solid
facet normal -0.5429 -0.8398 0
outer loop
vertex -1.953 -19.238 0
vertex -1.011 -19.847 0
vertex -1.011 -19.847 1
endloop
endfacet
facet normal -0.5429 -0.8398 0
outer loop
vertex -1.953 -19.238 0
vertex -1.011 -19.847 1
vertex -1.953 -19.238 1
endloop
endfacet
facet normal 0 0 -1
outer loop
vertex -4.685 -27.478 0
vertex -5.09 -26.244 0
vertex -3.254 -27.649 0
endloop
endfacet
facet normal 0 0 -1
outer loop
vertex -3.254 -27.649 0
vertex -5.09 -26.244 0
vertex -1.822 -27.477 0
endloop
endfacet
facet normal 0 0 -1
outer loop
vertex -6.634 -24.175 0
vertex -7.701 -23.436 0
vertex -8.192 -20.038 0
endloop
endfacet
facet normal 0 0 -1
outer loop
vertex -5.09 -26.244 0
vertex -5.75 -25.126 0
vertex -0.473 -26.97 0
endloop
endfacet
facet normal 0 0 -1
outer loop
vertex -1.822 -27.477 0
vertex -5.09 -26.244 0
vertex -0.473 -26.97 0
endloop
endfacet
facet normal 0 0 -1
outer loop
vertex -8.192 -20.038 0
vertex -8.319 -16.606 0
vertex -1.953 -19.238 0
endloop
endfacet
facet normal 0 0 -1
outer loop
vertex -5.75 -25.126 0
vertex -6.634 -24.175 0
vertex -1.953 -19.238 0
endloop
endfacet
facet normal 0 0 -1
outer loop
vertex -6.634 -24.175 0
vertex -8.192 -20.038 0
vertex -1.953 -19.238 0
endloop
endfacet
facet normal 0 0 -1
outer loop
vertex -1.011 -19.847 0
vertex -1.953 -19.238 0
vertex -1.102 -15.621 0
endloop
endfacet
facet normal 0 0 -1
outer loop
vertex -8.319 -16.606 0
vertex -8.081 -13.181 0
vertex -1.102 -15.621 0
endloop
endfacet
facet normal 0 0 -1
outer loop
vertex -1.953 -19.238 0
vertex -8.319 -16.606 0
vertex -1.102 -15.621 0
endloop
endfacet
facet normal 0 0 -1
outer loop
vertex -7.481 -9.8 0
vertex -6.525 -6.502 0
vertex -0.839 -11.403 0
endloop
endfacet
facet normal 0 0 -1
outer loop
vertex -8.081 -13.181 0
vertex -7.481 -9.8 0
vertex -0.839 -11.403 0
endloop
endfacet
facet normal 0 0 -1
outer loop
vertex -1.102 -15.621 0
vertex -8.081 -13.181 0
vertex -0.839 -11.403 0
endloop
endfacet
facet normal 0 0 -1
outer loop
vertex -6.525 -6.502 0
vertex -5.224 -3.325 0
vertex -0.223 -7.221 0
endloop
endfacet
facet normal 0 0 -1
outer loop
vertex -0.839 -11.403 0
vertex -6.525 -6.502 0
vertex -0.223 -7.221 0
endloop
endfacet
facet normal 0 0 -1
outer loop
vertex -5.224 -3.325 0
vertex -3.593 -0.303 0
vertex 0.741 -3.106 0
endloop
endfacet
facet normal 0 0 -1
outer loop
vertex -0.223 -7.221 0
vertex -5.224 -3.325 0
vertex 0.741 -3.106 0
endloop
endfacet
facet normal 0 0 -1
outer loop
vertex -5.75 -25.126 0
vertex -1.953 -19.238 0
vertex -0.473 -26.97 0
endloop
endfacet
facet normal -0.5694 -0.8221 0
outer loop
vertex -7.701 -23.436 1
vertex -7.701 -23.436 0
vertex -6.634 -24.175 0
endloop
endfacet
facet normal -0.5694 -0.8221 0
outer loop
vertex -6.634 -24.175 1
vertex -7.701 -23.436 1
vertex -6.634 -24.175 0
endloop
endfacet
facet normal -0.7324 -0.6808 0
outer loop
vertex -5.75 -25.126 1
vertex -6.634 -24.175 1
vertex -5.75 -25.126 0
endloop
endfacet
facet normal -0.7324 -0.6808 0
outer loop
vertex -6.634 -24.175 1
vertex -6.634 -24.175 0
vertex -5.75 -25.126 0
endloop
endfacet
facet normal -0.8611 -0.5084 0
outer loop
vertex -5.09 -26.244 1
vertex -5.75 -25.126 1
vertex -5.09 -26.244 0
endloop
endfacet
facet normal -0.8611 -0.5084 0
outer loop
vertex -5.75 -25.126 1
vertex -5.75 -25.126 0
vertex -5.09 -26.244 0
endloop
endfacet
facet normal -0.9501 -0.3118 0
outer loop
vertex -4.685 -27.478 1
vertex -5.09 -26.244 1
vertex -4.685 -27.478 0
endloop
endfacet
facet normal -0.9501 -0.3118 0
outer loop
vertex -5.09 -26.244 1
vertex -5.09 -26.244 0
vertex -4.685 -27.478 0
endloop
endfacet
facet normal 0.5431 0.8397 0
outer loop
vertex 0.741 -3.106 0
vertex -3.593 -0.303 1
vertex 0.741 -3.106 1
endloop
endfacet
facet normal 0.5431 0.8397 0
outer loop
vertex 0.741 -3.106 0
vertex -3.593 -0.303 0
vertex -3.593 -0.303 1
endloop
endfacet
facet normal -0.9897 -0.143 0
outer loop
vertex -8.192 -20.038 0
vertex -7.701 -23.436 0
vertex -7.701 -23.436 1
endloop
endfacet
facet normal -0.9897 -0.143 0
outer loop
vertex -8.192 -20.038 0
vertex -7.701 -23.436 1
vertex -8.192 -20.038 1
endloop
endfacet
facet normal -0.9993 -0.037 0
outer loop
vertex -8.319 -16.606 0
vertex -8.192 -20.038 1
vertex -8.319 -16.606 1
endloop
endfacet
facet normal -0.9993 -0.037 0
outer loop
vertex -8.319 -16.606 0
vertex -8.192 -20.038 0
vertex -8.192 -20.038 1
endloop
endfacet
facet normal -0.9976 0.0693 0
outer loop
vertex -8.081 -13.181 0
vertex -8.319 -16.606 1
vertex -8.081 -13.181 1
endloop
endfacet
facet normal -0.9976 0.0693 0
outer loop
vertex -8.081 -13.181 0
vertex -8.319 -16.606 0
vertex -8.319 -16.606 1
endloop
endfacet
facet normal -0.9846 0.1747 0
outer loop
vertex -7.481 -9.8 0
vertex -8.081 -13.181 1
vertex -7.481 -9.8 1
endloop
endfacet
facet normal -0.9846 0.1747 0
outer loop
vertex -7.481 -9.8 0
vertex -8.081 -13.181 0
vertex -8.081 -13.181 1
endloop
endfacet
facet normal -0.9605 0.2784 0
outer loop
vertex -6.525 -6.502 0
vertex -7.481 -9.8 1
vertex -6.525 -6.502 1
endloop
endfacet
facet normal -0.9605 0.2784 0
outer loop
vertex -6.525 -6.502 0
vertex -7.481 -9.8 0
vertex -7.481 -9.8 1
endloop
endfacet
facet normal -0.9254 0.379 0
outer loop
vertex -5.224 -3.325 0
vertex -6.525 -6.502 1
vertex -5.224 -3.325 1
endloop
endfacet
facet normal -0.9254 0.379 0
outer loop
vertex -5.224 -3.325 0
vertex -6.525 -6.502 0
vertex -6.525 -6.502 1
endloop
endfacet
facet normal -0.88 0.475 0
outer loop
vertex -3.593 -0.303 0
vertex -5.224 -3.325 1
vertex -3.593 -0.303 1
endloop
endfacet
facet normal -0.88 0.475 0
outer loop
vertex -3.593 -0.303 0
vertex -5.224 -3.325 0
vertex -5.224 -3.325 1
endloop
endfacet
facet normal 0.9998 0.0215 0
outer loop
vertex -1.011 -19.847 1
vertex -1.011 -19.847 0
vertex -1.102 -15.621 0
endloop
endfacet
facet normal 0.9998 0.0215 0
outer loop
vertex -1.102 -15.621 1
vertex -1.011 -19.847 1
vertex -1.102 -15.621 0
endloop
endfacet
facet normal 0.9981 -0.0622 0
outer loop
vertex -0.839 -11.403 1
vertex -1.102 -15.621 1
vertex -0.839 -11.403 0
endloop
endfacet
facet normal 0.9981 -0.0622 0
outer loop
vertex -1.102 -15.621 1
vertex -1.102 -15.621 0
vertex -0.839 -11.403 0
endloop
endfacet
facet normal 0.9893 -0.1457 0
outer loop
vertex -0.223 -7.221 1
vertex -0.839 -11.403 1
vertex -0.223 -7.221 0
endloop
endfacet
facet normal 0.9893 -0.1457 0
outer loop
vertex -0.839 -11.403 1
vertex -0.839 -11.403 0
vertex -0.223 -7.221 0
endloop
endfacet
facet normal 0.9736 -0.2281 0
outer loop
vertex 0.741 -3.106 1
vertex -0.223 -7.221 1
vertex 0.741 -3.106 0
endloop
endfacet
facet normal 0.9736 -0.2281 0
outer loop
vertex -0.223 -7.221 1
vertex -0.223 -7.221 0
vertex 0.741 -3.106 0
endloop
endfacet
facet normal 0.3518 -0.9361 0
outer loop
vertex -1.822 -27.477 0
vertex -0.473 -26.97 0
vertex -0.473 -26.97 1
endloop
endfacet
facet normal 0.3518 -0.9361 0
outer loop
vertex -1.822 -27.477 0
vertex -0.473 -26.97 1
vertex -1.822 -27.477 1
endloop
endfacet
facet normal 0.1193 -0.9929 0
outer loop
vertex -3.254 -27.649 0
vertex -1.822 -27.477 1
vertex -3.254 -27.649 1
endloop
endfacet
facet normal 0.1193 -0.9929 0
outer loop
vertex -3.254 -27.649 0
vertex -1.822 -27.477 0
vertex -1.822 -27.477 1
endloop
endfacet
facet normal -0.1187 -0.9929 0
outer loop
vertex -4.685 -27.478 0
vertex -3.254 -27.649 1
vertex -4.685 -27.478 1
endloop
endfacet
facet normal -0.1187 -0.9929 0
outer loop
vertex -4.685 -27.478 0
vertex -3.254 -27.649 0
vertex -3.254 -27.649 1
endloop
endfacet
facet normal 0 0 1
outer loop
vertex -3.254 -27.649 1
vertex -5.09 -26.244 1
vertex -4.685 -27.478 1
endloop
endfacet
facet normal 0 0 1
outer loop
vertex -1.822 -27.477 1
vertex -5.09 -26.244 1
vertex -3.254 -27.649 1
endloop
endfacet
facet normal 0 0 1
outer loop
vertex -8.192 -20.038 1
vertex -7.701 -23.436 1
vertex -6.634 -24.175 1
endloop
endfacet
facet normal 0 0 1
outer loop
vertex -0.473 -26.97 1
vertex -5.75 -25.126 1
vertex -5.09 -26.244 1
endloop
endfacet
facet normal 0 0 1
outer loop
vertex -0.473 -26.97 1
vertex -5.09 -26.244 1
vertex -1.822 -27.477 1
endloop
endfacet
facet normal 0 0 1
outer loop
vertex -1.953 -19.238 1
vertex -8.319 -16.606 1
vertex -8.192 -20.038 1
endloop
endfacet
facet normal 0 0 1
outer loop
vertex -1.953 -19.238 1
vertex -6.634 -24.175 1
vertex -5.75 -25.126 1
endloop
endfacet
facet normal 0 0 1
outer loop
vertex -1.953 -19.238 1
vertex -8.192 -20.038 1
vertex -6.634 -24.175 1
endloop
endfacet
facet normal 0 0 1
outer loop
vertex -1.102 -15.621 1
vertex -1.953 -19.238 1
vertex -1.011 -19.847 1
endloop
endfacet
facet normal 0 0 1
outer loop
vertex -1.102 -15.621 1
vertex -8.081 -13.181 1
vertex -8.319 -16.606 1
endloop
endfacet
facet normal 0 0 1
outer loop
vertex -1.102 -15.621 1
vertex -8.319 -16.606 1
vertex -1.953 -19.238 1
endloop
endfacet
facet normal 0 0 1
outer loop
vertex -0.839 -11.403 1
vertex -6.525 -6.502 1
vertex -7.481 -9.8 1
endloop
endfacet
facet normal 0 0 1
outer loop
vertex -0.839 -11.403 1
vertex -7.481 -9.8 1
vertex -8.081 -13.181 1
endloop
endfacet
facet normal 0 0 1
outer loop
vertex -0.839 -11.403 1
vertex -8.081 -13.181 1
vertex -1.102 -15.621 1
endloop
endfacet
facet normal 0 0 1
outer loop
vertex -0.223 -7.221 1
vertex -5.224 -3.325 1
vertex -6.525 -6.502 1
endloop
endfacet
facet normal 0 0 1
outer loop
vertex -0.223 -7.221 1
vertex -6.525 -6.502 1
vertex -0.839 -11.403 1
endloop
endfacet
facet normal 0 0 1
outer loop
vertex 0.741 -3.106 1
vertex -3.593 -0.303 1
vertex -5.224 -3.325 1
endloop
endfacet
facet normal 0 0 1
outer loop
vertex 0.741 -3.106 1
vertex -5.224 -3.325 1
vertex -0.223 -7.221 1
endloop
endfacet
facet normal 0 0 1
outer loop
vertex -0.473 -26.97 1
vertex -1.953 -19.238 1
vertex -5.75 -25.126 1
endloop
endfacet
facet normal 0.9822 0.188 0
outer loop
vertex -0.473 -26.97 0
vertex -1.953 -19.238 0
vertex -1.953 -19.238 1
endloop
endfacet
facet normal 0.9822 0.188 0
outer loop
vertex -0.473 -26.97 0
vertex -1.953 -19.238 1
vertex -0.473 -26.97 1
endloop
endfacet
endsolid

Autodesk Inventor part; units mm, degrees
ref_plane "YZ Plane" through (0, 0, 0) normal (1, 0, 0) x (0, 1, 0)
ref_plane "XZ Plane" through (0, 0, 0) normal (0, 1, 0) x (-1, 0, 0)
ref_plane "XY Plane" through (0, 0, 0) normal (0, 0, 1) x (1, 0, 0)
sketch "Sketch1" plane through (0, 0, 0) normal (0, 0, 1) x (1, 0, 0)
  line L0 (-1.9526, -19.2383) -> (-0.4726, -26.9699)
  line L1 (-1.0107, -19.8473) -> (-1.9526, -19.2383)
  arc A0 (0.7413, -3.1056) -> (-1.0107, -19.8473) centre (49.2329, -16.6427) ccw
  line L2 (-3.5931, -0.3031) -> (0.7413, -3.1056)
  arc A1 (-3.5931, -0.3031) -> (-7.7014, -23.436) centre (23.9637, -17.1282) ccw
  arc A2 (-4.6851, -27.4777) -> (-7.7014, -23.436) centre (-10.5765, -28.728) ccw
  arc A3 (-4.6851, -27.4777) -> (-0.4726, -26.9699) centre (-3.2557, -21.6091) ccw
extrude "Extrusion1" add sketch "Sketch1" along normal blind 1
properties part number "cueromango"
